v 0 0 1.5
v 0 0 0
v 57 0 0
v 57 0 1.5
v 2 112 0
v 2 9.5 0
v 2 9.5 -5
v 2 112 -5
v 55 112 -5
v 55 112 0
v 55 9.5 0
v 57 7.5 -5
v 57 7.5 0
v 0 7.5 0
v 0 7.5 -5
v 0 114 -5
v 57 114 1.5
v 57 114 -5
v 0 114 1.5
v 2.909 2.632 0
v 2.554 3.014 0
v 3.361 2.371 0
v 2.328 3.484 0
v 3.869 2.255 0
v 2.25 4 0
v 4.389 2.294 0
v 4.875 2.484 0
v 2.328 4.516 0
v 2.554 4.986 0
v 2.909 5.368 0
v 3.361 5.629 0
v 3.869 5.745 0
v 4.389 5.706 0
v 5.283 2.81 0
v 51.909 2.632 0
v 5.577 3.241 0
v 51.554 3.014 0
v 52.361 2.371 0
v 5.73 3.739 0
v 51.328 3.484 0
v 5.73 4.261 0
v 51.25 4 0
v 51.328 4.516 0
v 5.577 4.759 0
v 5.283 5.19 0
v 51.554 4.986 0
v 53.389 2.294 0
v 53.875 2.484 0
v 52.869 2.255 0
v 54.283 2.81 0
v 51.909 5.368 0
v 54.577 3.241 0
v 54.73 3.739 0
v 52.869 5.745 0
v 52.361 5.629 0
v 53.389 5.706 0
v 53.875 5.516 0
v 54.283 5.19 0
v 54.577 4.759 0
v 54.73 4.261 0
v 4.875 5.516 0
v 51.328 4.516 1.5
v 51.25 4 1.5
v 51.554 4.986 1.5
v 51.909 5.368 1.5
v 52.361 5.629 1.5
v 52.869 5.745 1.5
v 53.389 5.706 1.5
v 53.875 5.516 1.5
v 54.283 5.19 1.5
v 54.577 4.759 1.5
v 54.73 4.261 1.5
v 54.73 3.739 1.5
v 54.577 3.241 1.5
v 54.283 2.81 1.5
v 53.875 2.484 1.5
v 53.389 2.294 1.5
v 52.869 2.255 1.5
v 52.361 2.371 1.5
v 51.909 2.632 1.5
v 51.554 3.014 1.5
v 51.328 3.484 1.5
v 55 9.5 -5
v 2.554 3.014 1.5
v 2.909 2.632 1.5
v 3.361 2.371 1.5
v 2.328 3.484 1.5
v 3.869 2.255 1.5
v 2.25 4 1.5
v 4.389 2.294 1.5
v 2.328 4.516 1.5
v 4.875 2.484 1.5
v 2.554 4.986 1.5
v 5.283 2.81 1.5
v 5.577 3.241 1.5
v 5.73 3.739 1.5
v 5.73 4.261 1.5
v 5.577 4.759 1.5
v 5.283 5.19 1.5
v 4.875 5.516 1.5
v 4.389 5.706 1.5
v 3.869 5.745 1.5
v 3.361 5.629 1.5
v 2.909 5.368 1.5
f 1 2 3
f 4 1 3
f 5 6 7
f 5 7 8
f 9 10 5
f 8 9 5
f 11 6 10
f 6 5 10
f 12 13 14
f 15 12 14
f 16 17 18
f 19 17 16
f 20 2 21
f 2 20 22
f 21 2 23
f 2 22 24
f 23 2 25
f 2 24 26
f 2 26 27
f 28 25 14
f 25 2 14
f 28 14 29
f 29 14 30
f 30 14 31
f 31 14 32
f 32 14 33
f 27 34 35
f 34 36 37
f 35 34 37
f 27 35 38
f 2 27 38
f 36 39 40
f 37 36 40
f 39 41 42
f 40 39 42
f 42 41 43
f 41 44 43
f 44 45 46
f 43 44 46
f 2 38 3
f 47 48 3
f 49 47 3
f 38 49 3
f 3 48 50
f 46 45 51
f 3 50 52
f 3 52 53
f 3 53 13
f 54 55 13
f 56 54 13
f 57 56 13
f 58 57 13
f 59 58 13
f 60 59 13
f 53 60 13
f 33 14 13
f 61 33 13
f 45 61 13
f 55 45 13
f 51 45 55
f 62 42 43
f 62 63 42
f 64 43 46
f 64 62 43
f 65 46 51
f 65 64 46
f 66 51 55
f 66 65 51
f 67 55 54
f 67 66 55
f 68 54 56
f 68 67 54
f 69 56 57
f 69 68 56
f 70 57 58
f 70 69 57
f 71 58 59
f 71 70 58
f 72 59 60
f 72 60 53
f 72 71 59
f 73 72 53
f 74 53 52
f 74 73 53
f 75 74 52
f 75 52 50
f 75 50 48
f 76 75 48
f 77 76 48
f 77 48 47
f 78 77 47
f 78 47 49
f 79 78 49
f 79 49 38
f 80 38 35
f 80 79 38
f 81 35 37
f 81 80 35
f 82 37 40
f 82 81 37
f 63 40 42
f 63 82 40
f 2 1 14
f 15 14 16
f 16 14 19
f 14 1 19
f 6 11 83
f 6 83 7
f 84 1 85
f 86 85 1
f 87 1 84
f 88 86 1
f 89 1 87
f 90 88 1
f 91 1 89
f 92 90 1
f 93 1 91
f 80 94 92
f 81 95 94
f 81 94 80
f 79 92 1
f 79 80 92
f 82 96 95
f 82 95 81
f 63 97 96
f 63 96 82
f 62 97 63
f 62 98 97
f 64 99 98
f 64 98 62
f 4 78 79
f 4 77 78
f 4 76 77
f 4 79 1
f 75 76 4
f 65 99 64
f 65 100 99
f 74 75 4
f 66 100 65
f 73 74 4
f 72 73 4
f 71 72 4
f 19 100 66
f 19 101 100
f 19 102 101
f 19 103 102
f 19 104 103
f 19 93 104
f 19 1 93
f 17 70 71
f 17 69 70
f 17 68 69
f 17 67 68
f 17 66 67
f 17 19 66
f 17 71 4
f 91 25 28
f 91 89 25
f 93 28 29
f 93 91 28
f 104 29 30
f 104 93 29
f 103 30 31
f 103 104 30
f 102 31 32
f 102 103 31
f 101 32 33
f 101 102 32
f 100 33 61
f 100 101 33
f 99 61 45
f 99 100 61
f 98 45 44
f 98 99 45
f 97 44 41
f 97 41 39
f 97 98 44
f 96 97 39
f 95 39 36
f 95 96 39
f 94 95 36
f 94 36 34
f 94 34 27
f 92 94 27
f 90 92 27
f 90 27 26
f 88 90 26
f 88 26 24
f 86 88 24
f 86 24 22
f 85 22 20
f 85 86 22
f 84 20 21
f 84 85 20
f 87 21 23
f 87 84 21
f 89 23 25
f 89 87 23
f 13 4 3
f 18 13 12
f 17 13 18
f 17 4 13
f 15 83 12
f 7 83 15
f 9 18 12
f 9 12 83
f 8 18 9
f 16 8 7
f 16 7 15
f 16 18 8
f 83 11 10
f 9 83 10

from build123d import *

# Parameters (mm, degrees)
ESQUISSE1_W             = 57
ESQUISSE1_H             = 114
BOSS_EXTRU_1_DEPTH      = 1.5
ESQUISSE3_R             = 1.75
ESQUISSE3_W             = 57
ESQUISSE3_H             = 106.5
ESQUISSE3_W_2           = 53
ESQUISSE3_H_2           = 102.5
BOSS_EXTRU_2_DEPTH      = 5
ENL_V_START             = -12
ESQUISSE4_R             = 1.75
ENL_V_MAT_EXTRU_1_DEPTH = 12


with BuildPart() as part:
    # Esquisse1 → Boss.-Extru.1 (new body)
    with BuildSketch(Plane.XY):
        with Locations((28.5, 57)):
            Rectangle(ESQUISSE1_W, ESQUISSE1_H)
    extrude(amount=BOSS_EXTRU_1_DEPTH)

    # Esquisse3 → Boss.-Extru.2 (add)
    # profile 1 of 3: a face of its own
    with BuildSketch(Plane(origin=(0, 0, 0), x_dir=(-1, 0, 0), z_dir=(0, 0, -1))):
        with Locations((-4, 4)):
            Circle(ESQUISSE3_R)
    # profile 2 of 3: a face of its own
    with BuildSketch(Plane(origin=(0, 0, 0), x_dir=(-1, 0, 0), z_dir=(0, 0, -1))):
        with Locations((-53, 4)):
            Circle(ESQUISSE3_R)
    # profile 3 of 3: a face of its own
    with BuildSketch(Plane(origin=(0, 0, 0), x_dir=(-1, 0, 0), z_dir=(0, 0, -1))):
        with Locations((-28.5, 60.75)):
            Rectangle(ESQUISSE3_W, ESQUISSE3_H)
        with Locations((-28.5, 60.75)):
            Rectangle(ESQUISSE3_W_2, ESQUISSE3_H_2, mode=Mode.SUBTRACT)
    extrude(amount=BOSS_EXTRU_2_DEPTH)

    # Esquisse4 → Enlèv. mat.-Extru.1 (cut)
    with BuildSketch(Plane(origin=(0, 0, -5), x_dir=(-1, 0, 0), z_dir=(0, 0, -1)).offset(ENL_V_START)):
        with Locations((-4, 4)):
            Circle(ESQUISSE4_R)
        with Locations((-53, 4)):
            Circle(ESQUISSE4_R)
    extrude(amount=ENL_V_MAT_EXTRU_1_DEPTH, mode=Mode.SUBTRACT)


solid = part.part
